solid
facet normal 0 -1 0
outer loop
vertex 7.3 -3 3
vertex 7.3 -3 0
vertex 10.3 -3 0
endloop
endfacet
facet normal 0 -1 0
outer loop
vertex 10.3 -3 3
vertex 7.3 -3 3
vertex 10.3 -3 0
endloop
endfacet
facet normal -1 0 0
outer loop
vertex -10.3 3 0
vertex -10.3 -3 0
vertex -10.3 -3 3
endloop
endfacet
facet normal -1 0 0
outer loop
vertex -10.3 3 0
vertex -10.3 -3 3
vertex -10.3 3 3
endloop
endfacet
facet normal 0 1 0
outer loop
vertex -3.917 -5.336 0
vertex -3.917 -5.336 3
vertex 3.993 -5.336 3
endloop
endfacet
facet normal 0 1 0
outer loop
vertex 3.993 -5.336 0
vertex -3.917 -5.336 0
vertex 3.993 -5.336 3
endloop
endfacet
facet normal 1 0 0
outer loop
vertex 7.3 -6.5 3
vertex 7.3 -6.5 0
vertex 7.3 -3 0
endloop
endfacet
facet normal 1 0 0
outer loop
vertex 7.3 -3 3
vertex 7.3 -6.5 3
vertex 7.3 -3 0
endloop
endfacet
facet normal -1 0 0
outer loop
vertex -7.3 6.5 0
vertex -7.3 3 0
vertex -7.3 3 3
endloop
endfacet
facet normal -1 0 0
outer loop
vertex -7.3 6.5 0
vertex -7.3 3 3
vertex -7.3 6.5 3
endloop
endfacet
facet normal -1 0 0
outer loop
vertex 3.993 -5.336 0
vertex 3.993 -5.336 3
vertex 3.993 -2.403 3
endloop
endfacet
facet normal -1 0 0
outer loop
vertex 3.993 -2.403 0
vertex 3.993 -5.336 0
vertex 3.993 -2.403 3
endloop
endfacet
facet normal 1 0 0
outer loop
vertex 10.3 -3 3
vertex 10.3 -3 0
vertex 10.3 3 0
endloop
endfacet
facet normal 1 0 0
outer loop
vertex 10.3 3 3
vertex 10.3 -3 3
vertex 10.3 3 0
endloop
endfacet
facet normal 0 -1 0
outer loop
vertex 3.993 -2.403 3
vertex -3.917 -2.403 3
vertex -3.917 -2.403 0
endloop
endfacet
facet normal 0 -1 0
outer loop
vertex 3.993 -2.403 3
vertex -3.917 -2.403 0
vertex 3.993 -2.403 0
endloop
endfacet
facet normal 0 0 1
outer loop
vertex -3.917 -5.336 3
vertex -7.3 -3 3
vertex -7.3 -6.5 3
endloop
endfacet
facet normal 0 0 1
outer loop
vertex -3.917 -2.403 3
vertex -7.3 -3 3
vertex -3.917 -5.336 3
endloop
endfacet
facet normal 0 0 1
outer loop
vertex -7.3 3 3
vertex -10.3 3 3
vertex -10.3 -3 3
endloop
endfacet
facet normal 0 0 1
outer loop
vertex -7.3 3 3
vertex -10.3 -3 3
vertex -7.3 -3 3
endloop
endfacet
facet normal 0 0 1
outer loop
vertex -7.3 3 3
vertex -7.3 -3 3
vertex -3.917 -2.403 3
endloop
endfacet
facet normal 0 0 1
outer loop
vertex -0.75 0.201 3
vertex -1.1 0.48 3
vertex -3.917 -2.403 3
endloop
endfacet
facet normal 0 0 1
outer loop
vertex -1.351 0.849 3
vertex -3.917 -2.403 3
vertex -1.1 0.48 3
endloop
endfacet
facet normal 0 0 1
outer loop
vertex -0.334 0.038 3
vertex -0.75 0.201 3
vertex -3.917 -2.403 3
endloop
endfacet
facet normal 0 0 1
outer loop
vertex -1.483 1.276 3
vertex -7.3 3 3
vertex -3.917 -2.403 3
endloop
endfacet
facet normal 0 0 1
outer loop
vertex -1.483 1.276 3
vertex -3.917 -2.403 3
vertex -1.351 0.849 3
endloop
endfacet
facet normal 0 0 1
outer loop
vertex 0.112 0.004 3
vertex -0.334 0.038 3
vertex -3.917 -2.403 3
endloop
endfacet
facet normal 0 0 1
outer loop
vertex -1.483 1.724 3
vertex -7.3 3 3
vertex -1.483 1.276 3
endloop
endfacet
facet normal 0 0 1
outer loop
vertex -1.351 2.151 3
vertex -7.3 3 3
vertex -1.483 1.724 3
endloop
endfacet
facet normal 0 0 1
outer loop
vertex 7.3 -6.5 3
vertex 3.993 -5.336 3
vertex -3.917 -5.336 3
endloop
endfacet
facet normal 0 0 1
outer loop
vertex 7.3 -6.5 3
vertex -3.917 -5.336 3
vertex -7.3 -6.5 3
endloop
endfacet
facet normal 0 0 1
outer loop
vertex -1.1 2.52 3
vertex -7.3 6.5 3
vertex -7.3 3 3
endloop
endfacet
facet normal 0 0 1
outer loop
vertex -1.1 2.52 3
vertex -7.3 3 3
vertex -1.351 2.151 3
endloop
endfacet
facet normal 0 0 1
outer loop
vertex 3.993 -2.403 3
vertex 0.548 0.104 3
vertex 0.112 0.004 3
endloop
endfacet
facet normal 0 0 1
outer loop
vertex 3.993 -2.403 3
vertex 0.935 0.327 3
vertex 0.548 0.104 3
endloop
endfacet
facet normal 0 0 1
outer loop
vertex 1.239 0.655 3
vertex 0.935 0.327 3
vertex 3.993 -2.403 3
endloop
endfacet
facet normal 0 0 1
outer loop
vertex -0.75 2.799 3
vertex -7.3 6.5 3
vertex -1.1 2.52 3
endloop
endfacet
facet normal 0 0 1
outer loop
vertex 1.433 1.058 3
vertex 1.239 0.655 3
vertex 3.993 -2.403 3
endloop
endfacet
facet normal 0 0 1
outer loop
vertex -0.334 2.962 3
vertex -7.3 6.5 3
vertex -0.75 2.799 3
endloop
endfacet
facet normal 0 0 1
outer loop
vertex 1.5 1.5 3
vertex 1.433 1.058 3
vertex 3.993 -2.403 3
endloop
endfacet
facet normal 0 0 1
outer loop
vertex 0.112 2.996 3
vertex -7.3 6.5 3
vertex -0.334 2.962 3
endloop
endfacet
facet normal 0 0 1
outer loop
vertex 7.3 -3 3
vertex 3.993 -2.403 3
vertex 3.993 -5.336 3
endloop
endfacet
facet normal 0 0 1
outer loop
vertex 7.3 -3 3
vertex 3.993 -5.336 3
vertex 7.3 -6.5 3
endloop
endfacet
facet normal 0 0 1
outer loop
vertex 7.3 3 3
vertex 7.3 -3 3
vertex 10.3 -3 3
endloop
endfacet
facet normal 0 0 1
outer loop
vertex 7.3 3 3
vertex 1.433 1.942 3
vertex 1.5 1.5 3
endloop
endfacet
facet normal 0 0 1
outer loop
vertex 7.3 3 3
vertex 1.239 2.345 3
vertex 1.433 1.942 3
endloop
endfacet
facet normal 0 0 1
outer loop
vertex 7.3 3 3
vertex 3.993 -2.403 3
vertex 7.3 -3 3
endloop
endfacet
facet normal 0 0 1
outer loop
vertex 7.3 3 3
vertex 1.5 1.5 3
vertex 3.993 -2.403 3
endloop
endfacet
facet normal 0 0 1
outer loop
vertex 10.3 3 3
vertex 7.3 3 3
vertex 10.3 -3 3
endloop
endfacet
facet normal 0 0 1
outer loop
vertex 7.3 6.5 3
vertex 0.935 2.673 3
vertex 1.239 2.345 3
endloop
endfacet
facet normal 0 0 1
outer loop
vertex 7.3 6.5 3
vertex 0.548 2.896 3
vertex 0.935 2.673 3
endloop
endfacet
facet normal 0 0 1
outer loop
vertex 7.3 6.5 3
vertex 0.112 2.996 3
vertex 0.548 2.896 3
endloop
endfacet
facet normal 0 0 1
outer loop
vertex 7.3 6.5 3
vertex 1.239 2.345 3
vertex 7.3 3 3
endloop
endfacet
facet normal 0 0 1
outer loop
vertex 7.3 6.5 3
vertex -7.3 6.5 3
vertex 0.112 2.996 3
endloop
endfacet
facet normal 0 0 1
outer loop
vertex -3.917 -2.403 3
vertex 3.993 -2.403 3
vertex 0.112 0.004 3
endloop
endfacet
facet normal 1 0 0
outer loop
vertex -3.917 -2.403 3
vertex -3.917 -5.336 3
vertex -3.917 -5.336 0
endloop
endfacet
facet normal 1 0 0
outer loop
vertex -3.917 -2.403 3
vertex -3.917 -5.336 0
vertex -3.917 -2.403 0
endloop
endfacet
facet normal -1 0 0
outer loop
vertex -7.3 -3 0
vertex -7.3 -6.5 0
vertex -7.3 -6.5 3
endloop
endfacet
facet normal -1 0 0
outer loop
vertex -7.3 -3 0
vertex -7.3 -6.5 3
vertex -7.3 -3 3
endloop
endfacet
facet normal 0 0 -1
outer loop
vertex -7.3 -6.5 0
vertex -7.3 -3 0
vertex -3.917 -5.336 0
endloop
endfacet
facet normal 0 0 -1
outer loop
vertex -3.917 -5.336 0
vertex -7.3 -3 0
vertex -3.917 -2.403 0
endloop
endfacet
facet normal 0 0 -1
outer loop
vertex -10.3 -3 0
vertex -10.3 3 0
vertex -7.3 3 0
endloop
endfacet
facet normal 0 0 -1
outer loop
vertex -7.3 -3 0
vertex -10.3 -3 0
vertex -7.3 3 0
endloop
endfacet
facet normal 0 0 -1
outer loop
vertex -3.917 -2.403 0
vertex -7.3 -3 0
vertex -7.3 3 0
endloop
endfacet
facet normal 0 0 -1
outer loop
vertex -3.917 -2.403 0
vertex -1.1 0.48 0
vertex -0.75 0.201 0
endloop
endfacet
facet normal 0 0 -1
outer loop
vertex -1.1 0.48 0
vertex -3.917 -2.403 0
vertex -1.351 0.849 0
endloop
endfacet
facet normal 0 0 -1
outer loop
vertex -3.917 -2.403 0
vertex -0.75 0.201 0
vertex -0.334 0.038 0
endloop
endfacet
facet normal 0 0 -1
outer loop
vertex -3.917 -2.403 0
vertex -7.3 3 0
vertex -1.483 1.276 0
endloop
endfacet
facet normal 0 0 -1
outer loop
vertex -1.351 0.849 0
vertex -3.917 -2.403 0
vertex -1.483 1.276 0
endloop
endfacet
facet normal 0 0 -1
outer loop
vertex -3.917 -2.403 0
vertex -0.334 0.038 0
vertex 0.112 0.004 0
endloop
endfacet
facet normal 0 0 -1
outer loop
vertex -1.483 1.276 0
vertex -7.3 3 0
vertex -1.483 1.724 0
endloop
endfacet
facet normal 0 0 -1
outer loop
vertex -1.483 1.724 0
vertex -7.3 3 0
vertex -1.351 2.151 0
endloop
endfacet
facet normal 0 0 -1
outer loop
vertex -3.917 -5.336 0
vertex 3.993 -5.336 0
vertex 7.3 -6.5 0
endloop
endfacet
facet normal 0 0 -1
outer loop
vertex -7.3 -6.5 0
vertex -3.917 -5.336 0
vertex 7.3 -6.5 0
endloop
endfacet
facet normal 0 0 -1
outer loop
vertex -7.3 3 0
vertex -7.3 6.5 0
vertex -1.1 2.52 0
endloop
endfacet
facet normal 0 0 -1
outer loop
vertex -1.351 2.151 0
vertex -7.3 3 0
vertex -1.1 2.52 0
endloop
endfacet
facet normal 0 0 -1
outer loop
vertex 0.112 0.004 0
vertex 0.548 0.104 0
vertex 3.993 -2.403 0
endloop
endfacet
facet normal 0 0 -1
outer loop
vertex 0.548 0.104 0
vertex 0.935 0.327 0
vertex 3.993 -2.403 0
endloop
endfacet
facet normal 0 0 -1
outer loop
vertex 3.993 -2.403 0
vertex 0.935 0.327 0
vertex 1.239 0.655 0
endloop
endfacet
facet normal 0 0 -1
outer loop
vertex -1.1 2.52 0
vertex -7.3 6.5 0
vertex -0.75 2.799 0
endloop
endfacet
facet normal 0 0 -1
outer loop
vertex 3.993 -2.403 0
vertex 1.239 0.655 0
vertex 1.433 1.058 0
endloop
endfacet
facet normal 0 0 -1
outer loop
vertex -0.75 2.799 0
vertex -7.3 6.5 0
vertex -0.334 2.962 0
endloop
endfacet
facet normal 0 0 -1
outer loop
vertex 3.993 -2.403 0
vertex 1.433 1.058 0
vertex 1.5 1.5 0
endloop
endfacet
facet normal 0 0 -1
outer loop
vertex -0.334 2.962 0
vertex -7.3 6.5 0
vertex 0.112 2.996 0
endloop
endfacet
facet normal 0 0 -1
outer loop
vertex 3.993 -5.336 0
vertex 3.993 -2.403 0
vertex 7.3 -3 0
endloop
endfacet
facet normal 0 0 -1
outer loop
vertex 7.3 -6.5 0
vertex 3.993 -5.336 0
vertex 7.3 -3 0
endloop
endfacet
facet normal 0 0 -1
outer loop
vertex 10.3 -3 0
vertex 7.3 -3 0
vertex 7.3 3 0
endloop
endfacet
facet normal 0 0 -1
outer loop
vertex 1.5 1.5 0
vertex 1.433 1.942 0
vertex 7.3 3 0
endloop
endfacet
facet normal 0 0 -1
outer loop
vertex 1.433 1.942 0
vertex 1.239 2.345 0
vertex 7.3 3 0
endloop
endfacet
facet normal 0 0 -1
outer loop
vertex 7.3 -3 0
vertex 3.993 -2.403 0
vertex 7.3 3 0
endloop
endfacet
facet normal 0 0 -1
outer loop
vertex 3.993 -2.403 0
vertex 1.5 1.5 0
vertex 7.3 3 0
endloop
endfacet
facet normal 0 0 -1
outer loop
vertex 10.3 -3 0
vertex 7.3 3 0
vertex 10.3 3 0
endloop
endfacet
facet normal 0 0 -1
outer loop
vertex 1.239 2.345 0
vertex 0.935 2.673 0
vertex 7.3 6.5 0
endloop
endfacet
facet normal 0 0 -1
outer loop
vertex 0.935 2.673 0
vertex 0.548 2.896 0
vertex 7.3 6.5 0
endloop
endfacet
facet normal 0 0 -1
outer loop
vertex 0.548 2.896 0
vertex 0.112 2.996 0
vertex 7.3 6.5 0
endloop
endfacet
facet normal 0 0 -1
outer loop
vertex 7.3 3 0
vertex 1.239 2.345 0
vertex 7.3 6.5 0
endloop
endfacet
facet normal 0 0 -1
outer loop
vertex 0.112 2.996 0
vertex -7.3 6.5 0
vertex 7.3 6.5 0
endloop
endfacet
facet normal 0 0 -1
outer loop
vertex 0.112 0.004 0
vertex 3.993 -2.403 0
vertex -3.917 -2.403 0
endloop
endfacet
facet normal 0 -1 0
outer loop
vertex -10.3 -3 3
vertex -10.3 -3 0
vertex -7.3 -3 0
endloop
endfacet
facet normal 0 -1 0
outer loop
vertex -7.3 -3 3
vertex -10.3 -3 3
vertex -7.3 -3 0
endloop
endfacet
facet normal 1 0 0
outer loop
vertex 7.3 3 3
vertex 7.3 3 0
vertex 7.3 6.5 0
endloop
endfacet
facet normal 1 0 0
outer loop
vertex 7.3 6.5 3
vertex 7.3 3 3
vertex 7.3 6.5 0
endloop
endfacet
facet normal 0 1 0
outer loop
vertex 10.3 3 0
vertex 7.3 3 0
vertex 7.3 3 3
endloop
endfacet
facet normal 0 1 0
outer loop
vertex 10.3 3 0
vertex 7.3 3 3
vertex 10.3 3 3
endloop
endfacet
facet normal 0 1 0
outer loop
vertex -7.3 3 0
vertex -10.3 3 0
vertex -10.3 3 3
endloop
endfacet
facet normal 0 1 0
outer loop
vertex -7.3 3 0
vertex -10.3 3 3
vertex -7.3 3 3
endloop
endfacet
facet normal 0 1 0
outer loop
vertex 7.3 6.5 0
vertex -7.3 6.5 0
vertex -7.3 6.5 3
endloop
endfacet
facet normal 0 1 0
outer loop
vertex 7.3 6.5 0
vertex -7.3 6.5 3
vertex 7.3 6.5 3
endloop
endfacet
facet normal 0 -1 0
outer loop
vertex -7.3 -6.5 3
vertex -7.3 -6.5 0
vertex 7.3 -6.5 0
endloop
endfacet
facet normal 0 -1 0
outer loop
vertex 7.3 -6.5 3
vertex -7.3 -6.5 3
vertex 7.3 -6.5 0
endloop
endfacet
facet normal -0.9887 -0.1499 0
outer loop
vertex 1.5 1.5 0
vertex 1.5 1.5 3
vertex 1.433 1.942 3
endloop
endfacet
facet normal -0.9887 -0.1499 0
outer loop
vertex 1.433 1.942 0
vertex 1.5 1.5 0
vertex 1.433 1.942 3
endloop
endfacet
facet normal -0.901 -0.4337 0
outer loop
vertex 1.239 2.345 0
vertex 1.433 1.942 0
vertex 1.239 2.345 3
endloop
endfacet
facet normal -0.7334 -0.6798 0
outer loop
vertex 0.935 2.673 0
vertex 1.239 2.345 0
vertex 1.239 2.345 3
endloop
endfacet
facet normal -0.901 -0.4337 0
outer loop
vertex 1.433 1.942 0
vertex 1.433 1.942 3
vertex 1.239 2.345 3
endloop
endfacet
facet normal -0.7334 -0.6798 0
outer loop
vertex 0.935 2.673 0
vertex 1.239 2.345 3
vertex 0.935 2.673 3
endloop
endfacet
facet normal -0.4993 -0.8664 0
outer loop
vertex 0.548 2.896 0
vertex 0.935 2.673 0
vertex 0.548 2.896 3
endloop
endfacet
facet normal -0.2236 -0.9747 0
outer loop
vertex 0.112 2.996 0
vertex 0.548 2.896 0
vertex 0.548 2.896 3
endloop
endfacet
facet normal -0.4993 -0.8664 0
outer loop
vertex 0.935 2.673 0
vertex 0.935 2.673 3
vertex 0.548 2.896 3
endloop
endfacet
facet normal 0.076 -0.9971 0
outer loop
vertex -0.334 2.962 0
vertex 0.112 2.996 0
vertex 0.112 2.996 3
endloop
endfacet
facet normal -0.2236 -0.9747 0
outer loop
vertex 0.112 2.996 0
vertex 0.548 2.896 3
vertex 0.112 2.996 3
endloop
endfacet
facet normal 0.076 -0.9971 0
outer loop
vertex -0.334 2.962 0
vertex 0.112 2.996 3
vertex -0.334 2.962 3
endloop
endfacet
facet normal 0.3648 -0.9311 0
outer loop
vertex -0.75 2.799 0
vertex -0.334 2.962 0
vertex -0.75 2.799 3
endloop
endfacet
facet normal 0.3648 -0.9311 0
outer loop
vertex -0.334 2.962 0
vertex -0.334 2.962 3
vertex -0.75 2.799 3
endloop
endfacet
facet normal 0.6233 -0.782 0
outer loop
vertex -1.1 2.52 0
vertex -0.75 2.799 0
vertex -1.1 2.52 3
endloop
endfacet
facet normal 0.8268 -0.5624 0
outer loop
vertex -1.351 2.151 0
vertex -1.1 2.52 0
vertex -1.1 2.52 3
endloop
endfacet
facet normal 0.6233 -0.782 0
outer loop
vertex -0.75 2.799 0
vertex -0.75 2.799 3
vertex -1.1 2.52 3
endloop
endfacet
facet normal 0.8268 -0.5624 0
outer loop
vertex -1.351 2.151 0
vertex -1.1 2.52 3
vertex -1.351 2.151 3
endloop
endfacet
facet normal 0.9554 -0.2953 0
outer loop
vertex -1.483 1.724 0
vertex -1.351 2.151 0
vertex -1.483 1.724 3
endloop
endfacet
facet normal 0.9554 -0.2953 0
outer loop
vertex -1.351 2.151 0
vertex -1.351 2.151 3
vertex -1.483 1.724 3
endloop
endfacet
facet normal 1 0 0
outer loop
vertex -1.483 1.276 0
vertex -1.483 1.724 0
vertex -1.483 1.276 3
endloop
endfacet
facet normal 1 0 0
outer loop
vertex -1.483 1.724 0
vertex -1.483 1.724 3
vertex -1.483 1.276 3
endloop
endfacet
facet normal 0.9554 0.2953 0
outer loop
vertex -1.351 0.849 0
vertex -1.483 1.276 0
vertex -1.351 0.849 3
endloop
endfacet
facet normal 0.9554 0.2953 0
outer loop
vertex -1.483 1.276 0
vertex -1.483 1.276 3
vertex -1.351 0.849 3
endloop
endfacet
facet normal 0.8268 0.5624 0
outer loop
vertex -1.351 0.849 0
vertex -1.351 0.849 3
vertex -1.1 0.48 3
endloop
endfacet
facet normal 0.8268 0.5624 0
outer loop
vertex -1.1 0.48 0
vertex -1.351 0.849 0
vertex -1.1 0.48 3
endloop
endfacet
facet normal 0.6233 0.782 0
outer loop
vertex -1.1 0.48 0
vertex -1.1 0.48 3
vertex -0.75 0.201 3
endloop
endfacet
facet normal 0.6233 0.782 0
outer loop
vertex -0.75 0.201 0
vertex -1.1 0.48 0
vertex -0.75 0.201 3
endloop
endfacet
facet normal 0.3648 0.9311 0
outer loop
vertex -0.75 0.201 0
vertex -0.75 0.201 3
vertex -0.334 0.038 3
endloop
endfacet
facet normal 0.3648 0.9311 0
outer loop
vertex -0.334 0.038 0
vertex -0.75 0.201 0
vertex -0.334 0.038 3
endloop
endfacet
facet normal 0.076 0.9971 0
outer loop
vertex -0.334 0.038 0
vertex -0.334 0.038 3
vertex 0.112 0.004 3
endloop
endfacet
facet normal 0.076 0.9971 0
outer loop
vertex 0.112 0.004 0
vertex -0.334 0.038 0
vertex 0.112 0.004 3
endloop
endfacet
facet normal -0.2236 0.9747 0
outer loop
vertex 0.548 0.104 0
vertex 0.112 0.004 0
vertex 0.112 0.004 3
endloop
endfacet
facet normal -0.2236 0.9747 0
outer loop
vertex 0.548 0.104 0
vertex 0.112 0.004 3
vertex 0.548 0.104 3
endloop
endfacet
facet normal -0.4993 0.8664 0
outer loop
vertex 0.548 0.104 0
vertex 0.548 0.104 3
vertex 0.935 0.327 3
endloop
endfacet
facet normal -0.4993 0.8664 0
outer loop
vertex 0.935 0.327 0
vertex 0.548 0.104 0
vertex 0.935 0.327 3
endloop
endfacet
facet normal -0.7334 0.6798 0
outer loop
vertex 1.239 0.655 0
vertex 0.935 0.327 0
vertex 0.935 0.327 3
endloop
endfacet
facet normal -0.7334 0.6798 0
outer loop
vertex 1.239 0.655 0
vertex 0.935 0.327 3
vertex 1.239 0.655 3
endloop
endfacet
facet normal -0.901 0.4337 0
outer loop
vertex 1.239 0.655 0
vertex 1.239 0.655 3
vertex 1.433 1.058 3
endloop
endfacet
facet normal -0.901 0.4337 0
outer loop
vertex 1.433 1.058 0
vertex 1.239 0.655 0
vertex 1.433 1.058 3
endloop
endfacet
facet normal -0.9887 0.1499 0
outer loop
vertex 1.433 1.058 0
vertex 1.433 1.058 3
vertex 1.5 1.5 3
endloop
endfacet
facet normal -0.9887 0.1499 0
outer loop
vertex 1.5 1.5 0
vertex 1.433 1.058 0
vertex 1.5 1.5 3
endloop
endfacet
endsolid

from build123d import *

# Parameters (mm, degrees)
CROQUIS1_W              = 14.6
CROQUIS1_H              = 13
CROQUIS1_W_2            = 3
CROQUIS1_H_2            = 6
SALIENTE_EXTRUIR1_DEPTH = 3
CROQUIS2_R              = 1.5
CROQUIS2_W              = 7.910028885
CROQUIS2_H              = 2.9332022
CORTAR_EXTRUIR1_DEPTH   = 10


with BuildPart() as part:
    # Croquis1 → Saliente-Extruir1 (new body)
    with BuildSketch(Plane.XY):
        Rectangle(CROQUIS1_W, CROQUIS1_H)
        with Locations((-8.8, 0)):
            Rectangle(CROQUIS1_W_2, CROQUIS1_H_2)
        with Locations((8.8, 0)):
            Rectangle(CROQUIS1_W_2, CROQUIS1_H_2)
    extrude(amount=SALIENTE_EXTRUIR1_DEPTH)

    # Croquis2 → Cortar-Extruir1 (cut)
    with BuildSketch(Plane.XY.offset(3)):
        with Locations((0, 1.5)):
            Circle(CROQUIS2_R)
        with Locations((0.038370941, -3.869685697)):
            Rectangle(CROQUIS2_W, CROQUIS2_H)
    extrude(amount=-CORTAR_EXTRUIR1_DEPTH, mode=Mode.SUBTRACT)


solid = part.part
